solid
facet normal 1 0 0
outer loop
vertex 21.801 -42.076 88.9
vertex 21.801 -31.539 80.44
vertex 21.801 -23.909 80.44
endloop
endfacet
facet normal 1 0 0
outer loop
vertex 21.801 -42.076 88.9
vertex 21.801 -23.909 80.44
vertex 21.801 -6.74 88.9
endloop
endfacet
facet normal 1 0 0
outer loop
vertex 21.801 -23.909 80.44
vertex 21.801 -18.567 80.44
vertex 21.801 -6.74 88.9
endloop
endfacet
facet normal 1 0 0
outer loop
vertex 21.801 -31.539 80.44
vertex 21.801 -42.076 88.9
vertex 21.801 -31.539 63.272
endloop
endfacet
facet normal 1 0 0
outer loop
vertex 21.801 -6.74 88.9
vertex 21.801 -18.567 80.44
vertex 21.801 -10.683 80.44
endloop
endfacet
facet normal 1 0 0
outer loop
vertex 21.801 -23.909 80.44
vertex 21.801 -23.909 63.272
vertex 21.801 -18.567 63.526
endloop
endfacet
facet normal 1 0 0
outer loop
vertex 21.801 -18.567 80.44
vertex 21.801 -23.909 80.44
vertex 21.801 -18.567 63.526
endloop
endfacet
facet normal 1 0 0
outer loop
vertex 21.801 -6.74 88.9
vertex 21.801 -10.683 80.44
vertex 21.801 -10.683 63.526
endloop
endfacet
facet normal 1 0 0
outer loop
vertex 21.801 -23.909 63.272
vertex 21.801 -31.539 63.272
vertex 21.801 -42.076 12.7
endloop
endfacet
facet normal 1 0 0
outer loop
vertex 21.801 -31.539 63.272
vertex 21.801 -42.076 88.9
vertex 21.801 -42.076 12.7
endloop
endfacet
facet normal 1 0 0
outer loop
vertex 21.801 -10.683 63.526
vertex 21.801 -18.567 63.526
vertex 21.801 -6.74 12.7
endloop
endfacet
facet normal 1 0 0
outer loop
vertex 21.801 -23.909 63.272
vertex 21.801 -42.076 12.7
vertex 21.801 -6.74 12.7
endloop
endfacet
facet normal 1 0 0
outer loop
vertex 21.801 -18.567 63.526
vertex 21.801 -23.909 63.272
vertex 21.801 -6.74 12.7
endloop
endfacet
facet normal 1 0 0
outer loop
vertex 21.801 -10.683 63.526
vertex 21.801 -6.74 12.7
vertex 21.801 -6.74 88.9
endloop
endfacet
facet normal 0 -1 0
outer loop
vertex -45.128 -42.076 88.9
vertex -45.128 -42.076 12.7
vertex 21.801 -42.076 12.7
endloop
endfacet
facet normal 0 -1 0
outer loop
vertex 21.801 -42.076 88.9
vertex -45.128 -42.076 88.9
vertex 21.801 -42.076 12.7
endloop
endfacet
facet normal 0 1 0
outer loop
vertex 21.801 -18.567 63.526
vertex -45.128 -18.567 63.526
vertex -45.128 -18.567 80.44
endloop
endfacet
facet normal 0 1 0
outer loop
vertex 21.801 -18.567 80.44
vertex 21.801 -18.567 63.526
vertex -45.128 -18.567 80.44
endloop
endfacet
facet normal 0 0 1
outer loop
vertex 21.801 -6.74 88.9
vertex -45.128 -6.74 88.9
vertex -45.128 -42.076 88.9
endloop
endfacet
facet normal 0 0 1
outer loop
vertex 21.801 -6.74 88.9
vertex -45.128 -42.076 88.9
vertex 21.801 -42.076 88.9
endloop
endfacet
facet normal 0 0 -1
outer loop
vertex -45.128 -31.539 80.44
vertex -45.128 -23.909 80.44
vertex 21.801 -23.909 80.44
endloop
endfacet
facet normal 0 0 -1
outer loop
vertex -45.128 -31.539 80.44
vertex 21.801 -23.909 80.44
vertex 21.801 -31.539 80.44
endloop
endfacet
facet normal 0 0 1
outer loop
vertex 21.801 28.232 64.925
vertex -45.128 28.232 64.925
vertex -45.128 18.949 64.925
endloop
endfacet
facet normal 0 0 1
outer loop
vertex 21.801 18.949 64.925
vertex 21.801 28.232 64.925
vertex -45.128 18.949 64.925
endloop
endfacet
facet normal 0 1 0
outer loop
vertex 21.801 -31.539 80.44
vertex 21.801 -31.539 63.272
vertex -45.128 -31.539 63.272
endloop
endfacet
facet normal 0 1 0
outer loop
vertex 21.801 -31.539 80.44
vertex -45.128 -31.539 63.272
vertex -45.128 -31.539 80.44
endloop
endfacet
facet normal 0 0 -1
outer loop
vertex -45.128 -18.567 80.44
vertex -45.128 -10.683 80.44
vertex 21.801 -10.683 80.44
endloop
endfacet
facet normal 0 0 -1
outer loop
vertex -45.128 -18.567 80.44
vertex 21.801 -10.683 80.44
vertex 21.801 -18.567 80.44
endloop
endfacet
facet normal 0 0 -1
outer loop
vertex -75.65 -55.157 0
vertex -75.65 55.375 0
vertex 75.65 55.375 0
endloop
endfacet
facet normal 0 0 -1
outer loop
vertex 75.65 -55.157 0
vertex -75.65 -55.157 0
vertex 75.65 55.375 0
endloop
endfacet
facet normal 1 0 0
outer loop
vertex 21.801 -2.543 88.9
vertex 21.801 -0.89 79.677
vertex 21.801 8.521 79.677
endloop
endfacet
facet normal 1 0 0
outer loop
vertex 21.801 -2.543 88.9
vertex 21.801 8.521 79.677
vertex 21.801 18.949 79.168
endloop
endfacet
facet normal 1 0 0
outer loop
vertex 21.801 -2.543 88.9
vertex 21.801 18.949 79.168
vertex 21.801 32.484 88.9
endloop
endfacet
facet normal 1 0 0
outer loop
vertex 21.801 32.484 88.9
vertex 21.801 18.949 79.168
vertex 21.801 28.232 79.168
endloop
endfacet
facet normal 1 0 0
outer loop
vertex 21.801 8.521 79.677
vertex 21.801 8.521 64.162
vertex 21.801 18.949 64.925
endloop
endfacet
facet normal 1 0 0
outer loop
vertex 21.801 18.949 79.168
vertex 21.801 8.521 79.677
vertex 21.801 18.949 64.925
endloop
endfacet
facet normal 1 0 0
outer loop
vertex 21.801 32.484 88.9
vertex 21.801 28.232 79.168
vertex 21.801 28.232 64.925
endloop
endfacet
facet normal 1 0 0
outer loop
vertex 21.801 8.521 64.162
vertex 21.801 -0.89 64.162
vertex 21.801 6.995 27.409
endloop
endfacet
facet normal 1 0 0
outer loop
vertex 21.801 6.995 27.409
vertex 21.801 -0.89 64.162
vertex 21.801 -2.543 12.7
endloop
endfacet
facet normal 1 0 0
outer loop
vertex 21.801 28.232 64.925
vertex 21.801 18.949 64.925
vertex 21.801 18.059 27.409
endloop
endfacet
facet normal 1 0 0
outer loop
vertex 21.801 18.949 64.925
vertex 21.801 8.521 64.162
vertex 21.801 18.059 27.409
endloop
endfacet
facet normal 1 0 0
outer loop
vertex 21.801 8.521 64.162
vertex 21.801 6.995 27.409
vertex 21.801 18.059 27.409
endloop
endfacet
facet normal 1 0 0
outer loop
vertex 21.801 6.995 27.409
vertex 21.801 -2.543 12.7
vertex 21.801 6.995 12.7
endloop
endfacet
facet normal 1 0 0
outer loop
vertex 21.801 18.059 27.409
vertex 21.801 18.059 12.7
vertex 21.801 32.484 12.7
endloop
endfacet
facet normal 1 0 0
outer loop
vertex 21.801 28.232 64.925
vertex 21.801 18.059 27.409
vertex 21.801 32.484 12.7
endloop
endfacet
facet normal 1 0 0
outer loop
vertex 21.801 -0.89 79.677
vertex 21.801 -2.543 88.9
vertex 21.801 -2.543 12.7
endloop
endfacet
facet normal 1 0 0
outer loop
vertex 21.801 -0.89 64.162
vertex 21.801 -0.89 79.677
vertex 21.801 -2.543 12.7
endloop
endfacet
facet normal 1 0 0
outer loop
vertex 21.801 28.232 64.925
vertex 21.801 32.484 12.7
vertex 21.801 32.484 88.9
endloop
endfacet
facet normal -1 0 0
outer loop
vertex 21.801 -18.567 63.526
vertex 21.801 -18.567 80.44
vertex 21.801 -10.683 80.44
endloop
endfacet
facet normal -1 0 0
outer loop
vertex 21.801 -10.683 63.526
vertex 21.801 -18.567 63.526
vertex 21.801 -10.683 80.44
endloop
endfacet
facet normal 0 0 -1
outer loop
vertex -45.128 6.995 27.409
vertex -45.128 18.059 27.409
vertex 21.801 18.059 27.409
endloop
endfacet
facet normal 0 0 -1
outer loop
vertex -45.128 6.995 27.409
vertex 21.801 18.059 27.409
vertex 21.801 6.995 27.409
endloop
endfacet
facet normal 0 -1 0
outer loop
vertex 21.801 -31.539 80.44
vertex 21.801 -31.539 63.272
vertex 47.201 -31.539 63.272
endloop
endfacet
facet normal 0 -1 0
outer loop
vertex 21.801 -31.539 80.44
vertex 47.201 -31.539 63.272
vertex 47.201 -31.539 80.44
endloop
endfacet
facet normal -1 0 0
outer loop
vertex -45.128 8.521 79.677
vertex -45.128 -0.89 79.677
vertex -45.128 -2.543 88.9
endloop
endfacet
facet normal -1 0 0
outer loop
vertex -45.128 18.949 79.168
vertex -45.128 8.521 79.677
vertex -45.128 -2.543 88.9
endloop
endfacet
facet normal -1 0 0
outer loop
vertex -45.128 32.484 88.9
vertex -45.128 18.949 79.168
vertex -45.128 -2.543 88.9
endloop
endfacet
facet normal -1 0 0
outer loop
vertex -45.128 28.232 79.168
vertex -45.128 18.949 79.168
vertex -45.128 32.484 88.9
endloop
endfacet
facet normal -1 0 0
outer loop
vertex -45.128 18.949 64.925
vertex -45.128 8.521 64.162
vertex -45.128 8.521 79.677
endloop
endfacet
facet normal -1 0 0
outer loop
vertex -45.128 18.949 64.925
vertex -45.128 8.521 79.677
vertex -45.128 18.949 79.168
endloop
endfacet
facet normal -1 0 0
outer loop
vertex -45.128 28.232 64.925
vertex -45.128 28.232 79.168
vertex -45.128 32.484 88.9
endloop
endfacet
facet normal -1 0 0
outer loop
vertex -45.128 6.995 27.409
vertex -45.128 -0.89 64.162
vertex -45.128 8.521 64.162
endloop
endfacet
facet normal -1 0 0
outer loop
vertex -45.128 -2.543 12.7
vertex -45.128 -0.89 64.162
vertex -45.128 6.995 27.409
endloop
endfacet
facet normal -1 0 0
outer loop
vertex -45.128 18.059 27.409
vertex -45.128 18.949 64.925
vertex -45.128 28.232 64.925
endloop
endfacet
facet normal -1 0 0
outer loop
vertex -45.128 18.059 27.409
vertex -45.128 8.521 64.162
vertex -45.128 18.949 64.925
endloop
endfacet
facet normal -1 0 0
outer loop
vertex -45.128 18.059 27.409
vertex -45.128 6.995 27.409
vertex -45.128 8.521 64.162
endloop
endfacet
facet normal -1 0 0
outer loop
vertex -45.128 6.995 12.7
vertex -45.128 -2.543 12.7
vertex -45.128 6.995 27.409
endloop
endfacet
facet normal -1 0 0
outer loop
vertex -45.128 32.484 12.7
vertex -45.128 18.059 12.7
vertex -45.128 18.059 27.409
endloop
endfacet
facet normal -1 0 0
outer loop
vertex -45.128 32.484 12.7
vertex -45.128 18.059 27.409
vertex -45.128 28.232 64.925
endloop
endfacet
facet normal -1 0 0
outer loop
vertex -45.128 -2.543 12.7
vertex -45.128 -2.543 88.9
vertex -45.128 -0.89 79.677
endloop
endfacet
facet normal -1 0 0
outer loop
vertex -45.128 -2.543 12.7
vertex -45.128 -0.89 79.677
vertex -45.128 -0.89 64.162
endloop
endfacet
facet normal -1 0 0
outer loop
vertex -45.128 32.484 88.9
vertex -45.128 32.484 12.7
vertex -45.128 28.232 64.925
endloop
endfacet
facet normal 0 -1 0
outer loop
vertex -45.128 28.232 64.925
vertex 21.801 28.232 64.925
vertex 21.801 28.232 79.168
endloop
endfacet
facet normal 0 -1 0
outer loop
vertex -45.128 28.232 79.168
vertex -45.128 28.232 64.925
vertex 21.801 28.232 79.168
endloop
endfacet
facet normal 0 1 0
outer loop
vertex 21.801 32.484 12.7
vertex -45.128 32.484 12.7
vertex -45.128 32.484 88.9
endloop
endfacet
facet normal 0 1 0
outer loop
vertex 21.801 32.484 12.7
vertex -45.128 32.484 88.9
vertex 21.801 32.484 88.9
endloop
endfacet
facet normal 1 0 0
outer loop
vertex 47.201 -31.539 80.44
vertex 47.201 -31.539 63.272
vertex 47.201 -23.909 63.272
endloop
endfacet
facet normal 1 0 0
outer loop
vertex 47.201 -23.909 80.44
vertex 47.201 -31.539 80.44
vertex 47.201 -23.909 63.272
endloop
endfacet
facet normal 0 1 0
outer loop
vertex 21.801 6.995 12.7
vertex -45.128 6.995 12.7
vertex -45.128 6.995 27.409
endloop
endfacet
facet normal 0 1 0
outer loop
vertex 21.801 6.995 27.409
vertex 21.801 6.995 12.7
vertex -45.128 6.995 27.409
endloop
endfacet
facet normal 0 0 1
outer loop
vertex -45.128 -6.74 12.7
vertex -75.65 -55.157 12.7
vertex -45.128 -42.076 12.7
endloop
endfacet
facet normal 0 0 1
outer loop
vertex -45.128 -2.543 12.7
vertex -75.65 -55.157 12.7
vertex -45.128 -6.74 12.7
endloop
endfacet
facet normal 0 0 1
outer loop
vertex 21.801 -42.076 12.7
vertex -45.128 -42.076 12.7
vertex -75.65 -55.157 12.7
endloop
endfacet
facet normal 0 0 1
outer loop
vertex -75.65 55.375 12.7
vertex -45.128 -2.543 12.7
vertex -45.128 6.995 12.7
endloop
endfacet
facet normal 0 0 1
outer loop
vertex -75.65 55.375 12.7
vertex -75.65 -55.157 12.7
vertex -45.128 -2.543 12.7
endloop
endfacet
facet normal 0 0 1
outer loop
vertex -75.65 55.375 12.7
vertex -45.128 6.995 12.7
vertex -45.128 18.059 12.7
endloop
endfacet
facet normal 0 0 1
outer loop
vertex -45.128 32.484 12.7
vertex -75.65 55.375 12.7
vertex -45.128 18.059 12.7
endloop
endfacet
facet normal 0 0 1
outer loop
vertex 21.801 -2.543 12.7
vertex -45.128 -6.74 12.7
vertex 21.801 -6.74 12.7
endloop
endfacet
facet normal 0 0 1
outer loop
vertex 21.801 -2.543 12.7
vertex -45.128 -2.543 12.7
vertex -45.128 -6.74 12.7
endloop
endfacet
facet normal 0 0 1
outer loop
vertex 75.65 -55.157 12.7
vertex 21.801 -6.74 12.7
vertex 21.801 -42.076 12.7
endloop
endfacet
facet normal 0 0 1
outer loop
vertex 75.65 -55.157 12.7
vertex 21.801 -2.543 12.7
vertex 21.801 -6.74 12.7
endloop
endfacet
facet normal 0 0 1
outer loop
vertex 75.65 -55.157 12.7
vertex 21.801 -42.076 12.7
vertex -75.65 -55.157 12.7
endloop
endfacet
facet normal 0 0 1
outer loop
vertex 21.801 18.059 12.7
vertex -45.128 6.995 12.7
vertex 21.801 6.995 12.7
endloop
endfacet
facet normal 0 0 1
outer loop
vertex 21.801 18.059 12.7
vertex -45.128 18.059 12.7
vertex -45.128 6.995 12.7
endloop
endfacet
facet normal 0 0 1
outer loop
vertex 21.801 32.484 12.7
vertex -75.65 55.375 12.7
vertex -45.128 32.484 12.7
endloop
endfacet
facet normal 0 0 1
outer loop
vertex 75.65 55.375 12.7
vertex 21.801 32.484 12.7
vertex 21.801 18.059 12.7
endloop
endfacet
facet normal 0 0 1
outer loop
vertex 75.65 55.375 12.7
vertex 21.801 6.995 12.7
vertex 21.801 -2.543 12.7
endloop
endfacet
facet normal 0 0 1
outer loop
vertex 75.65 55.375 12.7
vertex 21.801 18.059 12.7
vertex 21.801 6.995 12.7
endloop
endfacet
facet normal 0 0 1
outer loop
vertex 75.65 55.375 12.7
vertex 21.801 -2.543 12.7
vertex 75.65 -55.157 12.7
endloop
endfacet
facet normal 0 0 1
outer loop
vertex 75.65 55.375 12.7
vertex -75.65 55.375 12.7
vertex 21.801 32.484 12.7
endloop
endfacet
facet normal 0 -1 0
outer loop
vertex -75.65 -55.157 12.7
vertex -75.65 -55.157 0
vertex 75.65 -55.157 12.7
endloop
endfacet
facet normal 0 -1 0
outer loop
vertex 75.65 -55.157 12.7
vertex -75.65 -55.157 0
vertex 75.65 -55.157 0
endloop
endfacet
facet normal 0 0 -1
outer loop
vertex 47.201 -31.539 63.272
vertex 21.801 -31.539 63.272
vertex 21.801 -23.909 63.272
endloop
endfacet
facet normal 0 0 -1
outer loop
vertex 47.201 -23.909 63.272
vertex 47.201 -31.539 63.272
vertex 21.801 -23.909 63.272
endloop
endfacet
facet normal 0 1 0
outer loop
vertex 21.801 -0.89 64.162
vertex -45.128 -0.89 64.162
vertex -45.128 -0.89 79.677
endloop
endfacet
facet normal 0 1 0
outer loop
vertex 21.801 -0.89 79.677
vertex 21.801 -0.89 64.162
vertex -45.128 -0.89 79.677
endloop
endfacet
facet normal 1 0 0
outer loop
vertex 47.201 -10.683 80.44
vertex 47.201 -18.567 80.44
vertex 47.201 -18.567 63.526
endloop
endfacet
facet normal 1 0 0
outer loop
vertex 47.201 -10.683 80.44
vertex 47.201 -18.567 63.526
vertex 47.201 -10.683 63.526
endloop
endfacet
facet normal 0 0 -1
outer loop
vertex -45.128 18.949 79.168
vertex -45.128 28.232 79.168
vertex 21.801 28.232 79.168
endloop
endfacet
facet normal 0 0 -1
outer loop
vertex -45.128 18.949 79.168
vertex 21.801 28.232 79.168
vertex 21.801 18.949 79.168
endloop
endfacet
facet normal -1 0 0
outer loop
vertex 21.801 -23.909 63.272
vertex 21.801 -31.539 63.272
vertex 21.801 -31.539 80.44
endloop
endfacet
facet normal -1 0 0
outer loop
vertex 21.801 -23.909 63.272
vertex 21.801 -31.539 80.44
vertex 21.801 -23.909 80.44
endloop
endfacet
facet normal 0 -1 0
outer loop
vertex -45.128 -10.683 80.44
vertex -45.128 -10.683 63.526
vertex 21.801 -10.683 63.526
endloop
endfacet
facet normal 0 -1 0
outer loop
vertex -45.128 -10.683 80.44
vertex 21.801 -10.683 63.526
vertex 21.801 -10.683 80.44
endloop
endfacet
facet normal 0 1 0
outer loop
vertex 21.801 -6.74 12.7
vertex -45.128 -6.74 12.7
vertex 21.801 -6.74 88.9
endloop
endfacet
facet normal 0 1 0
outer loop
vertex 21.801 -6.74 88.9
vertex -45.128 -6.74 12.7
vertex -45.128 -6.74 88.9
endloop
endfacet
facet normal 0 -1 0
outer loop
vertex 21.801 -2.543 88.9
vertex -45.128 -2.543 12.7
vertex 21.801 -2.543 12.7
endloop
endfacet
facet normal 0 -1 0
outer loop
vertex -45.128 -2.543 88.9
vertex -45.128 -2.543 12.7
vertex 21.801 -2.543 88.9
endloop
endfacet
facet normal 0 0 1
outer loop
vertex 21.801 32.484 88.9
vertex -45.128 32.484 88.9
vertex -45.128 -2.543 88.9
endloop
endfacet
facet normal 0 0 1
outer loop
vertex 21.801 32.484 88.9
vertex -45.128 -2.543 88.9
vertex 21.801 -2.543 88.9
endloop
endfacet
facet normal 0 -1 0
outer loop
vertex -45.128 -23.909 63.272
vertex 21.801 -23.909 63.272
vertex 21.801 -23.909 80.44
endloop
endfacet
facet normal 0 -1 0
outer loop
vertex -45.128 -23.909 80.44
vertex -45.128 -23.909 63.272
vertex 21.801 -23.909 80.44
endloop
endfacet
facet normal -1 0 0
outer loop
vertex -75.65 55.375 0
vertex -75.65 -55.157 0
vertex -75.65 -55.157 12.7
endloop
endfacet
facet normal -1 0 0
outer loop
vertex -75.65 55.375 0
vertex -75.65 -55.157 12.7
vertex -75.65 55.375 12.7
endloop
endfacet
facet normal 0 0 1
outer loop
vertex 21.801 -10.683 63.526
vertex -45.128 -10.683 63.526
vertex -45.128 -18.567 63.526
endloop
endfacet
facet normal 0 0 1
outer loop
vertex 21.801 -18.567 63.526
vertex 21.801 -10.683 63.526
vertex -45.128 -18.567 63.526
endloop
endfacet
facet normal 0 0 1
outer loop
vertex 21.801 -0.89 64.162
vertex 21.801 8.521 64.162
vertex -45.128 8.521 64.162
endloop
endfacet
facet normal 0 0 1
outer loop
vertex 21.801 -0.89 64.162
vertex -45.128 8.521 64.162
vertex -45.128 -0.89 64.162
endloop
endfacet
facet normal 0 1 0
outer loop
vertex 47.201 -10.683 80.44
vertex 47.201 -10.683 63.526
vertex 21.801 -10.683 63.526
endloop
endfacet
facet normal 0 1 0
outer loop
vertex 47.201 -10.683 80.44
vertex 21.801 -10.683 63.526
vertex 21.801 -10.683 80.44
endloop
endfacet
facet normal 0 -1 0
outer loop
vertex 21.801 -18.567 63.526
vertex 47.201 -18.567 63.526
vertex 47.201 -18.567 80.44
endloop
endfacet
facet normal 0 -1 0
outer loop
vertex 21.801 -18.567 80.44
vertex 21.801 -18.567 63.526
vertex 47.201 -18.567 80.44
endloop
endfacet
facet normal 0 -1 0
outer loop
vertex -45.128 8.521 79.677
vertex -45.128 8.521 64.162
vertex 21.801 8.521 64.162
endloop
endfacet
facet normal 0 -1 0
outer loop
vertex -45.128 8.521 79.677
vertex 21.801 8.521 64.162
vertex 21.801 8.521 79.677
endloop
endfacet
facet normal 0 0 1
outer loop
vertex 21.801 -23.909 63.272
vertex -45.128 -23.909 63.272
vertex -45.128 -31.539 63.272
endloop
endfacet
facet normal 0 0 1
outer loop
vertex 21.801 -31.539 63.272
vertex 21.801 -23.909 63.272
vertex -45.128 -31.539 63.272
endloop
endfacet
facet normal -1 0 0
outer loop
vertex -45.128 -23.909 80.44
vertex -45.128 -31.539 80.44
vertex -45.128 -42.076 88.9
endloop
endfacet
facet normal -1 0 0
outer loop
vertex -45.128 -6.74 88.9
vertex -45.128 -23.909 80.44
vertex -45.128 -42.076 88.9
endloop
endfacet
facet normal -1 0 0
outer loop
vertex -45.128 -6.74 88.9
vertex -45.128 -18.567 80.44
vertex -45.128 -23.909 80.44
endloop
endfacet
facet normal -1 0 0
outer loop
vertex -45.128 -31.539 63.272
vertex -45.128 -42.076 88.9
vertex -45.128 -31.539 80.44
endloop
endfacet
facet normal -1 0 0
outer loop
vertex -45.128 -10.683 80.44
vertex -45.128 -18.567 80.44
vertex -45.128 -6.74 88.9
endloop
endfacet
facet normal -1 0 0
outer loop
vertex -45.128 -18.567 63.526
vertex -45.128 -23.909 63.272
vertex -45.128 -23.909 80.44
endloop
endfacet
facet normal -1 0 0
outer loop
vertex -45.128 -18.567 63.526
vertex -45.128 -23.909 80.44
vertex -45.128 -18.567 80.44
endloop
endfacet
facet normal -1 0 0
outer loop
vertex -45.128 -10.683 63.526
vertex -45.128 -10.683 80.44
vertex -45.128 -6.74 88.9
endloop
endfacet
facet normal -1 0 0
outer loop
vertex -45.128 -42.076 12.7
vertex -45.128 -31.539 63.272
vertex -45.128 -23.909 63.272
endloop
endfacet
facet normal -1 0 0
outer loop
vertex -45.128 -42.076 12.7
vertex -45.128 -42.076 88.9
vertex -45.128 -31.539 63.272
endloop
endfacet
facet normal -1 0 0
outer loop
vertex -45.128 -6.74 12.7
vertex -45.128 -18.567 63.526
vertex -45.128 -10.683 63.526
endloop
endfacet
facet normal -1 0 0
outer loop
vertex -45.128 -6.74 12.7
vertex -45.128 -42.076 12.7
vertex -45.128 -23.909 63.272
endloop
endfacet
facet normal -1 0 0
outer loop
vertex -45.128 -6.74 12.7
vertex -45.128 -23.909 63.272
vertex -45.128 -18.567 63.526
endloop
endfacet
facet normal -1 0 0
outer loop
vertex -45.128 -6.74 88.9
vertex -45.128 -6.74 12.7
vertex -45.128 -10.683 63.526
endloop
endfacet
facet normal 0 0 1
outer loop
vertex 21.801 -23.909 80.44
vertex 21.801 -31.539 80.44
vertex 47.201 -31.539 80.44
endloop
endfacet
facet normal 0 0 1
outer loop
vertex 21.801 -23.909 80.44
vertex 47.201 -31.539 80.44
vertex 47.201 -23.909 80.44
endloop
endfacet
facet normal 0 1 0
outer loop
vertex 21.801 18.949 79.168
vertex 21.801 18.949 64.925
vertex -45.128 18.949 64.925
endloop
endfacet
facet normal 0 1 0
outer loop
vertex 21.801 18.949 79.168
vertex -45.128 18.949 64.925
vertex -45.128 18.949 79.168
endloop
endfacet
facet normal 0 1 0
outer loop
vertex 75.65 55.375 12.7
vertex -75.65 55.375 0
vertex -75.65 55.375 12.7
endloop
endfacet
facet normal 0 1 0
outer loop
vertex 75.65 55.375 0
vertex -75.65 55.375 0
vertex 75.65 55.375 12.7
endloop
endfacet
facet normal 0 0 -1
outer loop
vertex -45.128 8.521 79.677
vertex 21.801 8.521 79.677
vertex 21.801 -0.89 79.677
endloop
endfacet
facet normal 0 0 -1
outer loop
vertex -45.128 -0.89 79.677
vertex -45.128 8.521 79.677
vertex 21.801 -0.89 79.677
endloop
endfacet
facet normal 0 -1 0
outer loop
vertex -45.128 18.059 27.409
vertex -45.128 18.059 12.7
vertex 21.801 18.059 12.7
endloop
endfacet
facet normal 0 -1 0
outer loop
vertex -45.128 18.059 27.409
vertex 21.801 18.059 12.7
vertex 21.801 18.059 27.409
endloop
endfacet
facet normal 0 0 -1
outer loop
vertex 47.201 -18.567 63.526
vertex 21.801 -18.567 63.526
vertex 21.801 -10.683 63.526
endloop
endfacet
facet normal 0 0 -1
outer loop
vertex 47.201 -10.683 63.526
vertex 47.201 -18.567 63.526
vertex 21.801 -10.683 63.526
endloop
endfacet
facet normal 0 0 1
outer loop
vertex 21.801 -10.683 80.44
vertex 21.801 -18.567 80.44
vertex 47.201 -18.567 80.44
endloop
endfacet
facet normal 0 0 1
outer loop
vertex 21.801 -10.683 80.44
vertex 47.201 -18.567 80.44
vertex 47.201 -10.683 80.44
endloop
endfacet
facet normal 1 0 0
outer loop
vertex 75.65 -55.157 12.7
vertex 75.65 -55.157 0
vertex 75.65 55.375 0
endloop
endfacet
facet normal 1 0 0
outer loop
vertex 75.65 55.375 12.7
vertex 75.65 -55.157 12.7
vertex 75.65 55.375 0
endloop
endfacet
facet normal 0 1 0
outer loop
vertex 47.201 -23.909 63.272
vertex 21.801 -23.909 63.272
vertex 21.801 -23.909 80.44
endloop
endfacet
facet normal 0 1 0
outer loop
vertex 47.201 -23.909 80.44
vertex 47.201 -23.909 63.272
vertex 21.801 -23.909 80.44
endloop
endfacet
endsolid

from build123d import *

# Parameters (mm, degrees)
F0_W     = 151.299566
F0_H     = 110.531528
F1_DEPTH = 12.7
F2_W     = 66.929346
F2_H     = 74.559733
F3_DEPTH = 76.2
F4_W     = 11.064054
F4_H     = 14.708814
F4_W_2   = 9.283632
F4_H_2   = 14.243379
F4_W_3   = 9.410804
F4_H_3   = 15.515111
F4_W_4   = 7.884726
F4_H_4   = 16.91401
F4_W_5   = 7.630382
F4_H_5   = 17.168358
F4_W_6   = 4.196709
F4_H_6   = 76.2
F5_DEPTH = 152.4
F6_W     = 7.630382
F6_H     = 17.168358
F6_W_2   = 7.884726
F6_H_2   = 16.91401
F7_DEPTH = 25.4


with BuildPart() as f1:
    # F0 (on Top) → F1 (new body)
    with BuildSketch(Plane.XY):
        with Locations((0, 0.109004)):
            Rectangle(F0_W, F0_H)
    extrude(amount=F1_DEPTH)

    # F2 (on face) → F3 (join)
    with BuildSketch(Plane.XY.offset(12.7)):
        with Locations((-11.663583, -4.79624)):
            Rectangle(F2_W, F2_H)
    extrude(amount=F3_DEPTH)

    # F4 (on face) → F5 (cut)
    with BuildSketch(Plane(origin=(-45.128256, 0, 0), x_dir=(0, -1, 0), z_dir=(-1, 0, 0))):
        with Locations((-12.526543, 20.054407)):
            Rectangle(F4_W, F4_H)
        with Locations((-23.590596, 72.046549)):
            Rectangle(F4_W_2, F4_H_2)
        with Locations((-3.815191, 71.91937)):
            Rectangle(F4_W_3, F4_H_3)
        with Locations((14.624897, 71.982957)):
            Rectangle(F4_W_4, F4_H_4)
        with Locations((27.72372, 71.855783)):
            Rectangle(F4_W_5, F4_H_5)
        with Locations((4.641815, 50.8)):
            Rectangle(F4_W_6, F4_H_6)
    extrude(amount=-F5_DEPTH, mode=Mode.SUBTRACT)


with BuildPart() as f7:
    # F6 (on face) → F7 (new body)
    with BuildSketch(Plane.YZ.offset(21.80109)):
        with Locations((-27.72372, 71.855783)):
            Rectangle(F6_W, F6_H)
        with Locations((-14.624897, 71.982957)):
            Rectangle(F6_W_2, F6_H_2)
    extrude(amount=F7_DEPTH)


solid = Compound([f1.part, f7.part])
